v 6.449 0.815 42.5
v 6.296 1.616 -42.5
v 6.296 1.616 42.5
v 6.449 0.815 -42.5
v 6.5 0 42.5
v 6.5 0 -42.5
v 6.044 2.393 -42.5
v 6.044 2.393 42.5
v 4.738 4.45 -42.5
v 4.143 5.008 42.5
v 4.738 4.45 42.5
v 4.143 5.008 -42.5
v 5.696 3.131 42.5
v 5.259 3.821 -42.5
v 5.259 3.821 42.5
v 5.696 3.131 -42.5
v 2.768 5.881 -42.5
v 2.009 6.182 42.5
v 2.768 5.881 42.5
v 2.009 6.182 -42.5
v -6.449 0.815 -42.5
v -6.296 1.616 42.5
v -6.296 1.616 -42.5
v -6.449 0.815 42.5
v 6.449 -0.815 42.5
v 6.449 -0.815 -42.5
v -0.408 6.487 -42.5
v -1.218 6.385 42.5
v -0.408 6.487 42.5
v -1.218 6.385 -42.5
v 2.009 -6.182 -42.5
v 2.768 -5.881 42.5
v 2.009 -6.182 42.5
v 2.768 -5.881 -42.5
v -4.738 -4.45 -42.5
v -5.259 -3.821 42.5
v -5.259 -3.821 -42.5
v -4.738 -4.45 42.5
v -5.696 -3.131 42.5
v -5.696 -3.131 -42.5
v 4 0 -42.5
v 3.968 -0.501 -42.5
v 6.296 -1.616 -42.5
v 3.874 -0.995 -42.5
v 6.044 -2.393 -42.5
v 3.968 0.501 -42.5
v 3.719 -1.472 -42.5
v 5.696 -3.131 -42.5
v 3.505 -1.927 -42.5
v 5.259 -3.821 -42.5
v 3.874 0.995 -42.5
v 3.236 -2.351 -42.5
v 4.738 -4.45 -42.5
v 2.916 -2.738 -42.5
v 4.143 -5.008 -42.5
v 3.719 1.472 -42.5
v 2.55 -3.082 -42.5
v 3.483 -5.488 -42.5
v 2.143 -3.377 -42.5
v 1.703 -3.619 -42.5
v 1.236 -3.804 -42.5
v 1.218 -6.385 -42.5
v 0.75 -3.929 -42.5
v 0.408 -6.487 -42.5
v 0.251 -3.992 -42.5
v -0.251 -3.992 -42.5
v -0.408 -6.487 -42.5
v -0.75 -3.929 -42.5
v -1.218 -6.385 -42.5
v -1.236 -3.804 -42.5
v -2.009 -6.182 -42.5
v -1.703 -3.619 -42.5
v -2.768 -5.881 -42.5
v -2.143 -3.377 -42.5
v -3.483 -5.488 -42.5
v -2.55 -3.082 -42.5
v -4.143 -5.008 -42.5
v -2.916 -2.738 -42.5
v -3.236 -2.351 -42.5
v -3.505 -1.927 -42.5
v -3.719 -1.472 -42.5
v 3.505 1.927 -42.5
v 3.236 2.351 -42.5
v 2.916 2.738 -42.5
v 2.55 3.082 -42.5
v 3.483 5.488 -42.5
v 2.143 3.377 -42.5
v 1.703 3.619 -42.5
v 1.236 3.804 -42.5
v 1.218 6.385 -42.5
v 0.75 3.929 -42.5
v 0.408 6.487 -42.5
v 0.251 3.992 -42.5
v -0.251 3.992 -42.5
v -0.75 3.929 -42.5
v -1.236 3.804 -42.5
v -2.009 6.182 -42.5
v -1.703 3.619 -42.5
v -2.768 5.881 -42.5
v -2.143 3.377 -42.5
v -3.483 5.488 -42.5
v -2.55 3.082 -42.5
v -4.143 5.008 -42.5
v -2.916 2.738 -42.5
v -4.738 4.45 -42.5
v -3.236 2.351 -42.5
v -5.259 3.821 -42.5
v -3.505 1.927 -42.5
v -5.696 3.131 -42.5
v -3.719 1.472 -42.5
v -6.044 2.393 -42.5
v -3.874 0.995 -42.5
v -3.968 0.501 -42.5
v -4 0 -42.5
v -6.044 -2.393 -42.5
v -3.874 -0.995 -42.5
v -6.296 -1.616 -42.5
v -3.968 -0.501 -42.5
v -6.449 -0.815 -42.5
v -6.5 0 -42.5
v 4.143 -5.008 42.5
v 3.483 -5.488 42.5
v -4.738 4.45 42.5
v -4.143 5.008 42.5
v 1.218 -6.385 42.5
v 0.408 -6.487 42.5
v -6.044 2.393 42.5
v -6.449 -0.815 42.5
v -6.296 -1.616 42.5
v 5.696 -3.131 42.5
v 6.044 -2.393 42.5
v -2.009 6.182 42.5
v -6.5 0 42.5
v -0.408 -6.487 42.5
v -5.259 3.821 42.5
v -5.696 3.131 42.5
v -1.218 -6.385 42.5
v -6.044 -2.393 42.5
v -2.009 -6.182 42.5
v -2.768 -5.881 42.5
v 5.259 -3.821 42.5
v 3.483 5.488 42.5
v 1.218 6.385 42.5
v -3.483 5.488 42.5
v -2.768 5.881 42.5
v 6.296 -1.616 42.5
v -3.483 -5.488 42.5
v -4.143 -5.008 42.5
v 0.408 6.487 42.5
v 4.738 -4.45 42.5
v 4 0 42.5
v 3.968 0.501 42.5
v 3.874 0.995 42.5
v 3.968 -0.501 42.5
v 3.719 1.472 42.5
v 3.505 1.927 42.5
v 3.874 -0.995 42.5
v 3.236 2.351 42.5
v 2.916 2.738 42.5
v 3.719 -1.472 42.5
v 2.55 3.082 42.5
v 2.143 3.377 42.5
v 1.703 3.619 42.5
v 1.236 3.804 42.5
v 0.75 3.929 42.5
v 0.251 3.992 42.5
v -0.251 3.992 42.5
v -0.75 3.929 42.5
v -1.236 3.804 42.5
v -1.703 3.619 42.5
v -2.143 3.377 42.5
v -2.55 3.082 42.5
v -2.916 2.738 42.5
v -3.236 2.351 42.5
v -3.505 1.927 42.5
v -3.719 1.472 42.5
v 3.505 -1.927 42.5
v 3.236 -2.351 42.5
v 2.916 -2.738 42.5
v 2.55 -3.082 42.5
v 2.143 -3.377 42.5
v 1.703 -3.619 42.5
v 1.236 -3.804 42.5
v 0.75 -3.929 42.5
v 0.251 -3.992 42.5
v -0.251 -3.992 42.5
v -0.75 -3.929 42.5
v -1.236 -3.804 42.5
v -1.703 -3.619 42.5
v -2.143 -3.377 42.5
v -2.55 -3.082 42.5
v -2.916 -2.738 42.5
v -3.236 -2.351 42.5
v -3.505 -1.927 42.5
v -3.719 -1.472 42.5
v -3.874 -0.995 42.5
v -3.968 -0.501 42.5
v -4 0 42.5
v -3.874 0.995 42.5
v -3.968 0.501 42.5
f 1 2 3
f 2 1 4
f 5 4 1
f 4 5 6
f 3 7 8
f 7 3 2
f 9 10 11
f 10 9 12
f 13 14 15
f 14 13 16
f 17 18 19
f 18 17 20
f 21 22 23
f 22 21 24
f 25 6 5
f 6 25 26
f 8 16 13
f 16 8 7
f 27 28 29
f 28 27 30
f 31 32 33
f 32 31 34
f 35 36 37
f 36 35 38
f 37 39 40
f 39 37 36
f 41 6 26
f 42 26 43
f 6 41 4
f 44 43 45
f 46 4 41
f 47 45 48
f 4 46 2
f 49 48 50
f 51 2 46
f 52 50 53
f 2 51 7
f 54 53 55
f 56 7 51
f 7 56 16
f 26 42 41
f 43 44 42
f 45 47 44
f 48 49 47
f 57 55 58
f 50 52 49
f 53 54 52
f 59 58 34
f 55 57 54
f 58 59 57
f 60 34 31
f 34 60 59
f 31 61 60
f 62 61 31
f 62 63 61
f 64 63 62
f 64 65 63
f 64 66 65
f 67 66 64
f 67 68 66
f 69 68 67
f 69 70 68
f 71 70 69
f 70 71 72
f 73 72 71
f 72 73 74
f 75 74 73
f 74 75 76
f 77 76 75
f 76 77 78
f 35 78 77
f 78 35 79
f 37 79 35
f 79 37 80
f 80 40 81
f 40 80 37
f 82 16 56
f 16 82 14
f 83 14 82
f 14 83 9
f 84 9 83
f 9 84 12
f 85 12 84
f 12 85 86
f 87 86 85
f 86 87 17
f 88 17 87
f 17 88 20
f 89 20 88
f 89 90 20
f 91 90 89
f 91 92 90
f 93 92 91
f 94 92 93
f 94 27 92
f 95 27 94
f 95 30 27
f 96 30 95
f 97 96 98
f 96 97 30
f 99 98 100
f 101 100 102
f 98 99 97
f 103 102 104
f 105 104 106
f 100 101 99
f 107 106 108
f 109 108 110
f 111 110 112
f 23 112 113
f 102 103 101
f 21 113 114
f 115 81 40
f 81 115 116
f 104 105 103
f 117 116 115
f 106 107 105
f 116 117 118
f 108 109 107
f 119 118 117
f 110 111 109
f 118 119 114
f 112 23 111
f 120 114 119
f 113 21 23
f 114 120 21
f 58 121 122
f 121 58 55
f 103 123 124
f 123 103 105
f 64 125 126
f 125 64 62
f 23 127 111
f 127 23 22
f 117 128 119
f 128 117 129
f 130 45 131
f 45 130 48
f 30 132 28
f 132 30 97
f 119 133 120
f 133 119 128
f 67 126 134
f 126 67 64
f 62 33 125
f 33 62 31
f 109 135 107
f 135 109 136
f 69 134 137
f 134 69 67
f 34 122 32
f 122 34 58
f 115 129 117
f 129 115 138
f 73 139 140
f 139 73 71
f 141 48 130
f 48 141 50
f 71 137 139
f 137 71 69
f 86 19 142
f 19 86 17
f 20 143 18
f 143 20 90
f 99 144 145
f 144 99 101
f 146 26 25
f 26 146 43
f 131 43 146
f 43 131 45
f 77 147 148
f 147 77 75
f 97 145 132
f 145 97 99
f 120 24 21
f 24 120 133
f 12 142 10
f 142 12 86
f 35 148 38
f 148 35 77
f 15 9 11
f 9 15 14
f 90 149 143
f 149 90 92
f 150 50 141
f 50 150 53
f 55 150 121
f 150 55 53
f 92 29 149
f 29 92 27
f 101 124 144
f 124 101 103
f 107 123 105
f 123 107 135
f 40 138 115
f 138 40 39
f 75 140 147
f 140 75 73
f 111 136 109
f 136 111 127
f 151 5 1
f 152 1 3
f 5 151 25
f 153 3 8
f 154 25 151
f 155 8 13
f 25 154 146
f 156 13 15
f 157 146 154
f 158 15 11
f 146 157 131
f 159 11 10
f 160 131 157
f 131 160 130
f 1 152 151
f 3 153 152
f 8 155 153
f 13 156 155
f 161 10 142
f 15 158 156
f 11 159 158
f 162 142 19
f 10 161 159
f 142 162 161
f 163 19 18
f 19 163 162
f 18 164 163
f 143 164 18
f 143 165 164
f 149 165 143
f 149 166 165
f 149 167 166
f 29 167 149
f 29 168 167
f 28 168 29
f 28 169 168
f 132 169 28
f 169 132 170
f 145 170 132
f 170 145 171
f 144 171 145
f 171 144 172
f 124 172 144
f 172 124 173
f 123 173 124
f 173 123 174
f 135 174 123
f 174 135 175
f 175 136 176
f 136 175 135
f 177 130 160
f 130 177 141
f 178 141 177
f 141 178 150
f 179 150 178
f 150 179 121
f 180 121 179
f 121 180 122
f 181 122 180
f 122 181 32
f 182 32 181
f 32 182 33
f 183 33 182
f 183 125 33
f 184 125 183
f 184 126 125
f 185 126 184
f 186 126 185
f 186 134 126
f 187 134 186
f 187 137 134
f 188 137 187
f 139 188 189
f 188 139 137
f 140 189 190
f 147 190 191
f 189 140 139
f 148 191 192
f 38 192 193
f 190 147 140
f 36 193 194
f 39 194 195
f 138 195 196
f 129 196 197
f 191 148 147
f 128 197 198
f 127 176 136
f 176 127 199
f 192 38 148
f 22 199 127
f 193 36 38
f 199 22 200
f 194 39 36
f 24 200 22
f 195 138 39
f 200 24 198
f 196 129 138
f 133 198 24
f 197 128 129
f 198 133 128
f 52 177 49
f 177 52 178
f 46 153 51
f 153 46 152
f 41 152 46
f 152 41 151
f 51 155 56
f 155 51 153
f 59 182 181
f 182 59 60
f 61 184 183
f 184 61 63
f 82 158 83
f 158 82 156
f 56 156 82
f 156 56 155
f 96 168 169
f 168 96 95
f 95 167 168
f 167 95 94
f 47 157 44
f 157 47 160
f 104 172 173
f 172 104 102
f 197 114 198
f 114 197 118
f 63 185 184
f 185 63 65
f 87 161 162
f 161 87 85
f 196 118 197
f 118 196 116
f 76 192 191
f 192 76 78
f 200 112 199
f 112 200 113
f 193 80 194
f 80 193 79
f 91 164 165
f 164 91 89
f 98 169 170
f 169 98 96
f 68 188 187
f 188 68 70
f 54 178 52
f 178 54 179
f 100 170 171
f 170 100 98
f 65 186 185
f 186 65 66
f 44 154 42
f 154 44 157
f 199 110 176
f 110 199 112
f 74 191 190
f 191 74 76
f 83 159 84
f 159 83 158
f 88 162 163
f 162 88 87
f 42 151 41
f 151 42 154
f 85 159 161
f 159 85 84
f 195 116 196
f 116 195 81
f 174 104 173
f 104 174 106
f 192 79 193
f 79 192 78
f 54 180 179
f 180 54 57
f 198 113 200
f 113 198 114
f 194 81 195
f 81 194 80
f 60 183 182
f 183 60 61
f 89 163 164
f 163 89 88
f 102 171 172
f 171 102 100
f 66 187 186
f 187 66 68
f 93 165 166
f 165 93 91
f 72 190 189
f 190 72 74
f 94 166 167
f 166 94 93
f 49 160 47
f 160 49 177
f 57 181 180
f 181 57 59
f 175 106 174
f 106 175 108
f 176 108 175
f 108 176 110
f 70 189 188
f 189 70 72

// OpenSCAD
$fn = 50;


difference() {
	union() {
		translate(v = [0, 0, -42.5000000000]) {
			cylinder(h = 85, r = 6.5000000000);
		}
	}
	union() {
		translate(v = [0, 0, -100.0000000000]) {
			cylinder(h = 200, r = 4.0000000000);
		}
	}
}
